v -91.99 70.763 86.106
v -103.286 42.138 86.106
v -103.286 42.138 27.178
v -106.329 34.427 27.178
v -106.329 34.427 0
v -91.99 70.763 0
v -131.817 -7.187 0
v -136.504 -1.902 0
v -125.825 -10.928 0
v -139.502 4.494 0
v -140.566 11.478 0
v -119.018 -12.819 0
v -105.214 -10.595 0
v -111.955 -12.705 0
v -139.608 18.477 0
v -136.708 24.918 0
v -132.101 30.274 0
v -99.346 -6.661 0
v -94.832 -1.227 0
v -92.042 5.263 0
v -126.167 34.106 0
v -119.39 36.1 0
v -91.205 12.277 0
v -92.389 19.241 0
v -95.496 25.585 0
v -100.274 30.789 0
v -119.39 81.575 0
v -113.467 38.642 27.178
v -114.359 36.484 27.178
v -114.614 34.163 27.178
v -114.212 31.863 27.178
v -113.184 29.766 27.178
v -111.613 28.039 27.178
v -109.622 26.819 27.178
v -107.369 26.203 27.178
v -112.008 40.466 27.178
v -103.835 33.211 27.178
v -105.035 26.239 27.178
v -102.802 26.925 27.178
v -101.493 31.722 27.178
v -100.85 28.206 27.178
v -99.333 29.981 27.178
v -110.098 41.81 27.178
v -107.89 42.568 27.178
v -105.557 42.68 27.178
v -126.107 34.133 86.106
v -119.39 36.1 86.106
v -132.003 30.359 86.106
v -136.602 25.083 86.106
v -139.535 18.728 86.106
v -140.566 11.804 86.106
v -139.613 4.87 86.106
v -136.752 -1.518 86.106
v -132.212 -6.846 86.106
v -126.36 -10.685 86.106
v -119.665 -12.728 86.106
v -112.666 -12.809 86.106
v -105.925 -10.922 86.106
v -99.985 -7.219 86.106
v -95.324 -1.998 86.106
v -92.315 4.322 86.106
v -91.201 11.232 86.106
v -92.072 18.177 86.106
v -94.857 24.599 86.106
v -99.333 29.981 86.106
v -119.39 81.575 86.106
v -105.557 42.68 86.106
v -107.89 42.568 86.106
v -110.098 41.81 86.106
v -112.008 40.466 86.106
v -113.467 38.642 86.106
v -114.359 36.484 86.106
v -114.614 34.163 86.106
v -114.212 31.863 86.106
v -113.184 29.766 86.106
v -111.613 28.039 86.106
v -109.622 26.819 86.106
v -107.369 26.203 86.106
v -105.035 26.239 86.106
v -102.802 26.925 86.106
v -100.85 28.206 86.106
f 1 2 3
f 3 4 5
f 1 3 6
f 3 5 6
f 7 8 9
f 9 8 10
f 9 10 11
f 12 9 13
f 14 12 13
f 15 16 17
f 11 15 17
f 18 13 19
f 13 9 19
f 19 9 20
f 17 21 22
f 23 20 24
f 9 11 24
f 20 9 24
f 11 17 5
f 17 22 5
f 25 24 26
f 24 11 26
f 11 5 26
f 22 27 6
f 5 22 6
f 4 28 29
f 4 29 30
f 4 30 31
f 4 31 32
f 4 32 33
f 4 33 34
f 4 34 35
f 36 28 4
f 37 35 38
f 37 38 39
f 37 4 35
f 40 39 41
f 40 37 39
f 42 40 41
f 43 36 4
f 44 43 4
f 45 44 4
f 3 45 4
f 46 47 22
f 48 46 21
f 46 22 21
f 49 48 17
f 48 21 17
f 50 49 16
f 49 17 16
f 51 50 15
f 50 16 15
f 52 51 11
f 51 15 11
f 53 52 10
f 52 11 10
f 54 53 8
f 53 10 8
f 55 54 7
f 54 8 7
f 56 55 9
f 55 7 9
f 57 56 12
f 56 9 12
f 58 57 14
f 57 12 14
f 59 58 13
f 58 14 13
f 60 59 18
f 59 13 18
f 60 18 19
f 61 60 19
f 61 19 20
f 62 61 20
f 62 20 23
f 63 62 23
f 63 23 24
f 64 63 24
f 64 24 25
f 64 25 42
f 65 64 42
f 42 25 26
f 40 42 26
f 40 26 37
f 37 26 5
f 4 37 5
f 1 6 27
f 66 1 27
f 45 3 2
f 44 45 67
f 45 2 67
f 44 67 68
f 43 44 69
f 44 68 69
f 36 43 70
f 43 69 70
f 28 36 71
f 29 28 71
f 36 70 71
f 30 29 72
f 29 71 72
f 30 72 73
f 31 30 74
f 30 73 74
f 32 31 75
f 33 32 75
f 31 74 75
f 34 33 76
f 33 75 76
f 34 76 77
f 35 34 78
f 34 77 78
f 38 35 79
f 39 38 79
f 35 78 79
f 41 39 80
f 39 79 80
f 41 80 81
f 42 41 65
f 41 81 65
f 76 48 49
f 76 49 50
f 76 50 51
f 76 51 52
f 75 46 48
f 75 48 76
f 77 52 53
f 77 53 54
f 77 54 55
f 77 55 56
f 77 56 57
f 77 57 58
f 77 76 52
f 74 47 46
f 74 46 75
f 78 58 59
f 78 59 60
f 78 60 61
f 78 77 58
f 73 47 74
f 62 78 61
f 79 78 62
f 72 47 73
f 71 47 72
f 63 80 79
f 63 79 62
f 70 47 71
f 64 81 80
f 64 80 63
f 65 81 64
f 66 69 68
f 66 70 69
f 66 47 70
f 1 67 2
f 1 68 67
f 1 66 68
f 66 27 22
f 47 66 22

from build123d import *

# Parameters (mm, degrees)
F1_DEPTH = 86.106
F3_DEPTH = 58.928


with BuildPart() as f1:
    # F0 (on Top) → F1 (new body)
    with BuildSketch(Plane.XY):
        with BuildLine():
            Line((-119.3899347218, 81.5751131241), (-119.3899347218, 36.099622529))
            ThreePointArc((-119.3899347218, 36.099622529), (-119.0183715142, -12.8191604773), (-106.3290840641, 34.4266581107))
            Line((-106.3290840641, 34.4266581107), (-91.9901505113, 70.7625672221))
            Line((-91.9901505113, 70.7625672221), (-119.3899347218, 81.5751131241))
        make_face()
    extrude(amount=F1_DEPTH)

    # F2 (on face) → F3 (cut)
    with BuildSketch(Plane.XY.offset(86.106)):
        with BuildLine():
            Line((-106.3290840641, 34.4266581107), (-103.2862087041, 42.1375274103))
            ThreePointArc((-103.2862087041, 42.1375274103), (-114.2122343511, 31.8629620744), (-99.3326582188, 29.9806912638))
            ThreePointArc((-99.3326582188, 29.9806912638), (-102.6429075582, 32.4994648534), (-106.3290840641, 34.4266581107))
        make_face()
    extrude(amount=-F3_DEPTH, mode=Mode.SUBTRACT)


solid = f1.part
